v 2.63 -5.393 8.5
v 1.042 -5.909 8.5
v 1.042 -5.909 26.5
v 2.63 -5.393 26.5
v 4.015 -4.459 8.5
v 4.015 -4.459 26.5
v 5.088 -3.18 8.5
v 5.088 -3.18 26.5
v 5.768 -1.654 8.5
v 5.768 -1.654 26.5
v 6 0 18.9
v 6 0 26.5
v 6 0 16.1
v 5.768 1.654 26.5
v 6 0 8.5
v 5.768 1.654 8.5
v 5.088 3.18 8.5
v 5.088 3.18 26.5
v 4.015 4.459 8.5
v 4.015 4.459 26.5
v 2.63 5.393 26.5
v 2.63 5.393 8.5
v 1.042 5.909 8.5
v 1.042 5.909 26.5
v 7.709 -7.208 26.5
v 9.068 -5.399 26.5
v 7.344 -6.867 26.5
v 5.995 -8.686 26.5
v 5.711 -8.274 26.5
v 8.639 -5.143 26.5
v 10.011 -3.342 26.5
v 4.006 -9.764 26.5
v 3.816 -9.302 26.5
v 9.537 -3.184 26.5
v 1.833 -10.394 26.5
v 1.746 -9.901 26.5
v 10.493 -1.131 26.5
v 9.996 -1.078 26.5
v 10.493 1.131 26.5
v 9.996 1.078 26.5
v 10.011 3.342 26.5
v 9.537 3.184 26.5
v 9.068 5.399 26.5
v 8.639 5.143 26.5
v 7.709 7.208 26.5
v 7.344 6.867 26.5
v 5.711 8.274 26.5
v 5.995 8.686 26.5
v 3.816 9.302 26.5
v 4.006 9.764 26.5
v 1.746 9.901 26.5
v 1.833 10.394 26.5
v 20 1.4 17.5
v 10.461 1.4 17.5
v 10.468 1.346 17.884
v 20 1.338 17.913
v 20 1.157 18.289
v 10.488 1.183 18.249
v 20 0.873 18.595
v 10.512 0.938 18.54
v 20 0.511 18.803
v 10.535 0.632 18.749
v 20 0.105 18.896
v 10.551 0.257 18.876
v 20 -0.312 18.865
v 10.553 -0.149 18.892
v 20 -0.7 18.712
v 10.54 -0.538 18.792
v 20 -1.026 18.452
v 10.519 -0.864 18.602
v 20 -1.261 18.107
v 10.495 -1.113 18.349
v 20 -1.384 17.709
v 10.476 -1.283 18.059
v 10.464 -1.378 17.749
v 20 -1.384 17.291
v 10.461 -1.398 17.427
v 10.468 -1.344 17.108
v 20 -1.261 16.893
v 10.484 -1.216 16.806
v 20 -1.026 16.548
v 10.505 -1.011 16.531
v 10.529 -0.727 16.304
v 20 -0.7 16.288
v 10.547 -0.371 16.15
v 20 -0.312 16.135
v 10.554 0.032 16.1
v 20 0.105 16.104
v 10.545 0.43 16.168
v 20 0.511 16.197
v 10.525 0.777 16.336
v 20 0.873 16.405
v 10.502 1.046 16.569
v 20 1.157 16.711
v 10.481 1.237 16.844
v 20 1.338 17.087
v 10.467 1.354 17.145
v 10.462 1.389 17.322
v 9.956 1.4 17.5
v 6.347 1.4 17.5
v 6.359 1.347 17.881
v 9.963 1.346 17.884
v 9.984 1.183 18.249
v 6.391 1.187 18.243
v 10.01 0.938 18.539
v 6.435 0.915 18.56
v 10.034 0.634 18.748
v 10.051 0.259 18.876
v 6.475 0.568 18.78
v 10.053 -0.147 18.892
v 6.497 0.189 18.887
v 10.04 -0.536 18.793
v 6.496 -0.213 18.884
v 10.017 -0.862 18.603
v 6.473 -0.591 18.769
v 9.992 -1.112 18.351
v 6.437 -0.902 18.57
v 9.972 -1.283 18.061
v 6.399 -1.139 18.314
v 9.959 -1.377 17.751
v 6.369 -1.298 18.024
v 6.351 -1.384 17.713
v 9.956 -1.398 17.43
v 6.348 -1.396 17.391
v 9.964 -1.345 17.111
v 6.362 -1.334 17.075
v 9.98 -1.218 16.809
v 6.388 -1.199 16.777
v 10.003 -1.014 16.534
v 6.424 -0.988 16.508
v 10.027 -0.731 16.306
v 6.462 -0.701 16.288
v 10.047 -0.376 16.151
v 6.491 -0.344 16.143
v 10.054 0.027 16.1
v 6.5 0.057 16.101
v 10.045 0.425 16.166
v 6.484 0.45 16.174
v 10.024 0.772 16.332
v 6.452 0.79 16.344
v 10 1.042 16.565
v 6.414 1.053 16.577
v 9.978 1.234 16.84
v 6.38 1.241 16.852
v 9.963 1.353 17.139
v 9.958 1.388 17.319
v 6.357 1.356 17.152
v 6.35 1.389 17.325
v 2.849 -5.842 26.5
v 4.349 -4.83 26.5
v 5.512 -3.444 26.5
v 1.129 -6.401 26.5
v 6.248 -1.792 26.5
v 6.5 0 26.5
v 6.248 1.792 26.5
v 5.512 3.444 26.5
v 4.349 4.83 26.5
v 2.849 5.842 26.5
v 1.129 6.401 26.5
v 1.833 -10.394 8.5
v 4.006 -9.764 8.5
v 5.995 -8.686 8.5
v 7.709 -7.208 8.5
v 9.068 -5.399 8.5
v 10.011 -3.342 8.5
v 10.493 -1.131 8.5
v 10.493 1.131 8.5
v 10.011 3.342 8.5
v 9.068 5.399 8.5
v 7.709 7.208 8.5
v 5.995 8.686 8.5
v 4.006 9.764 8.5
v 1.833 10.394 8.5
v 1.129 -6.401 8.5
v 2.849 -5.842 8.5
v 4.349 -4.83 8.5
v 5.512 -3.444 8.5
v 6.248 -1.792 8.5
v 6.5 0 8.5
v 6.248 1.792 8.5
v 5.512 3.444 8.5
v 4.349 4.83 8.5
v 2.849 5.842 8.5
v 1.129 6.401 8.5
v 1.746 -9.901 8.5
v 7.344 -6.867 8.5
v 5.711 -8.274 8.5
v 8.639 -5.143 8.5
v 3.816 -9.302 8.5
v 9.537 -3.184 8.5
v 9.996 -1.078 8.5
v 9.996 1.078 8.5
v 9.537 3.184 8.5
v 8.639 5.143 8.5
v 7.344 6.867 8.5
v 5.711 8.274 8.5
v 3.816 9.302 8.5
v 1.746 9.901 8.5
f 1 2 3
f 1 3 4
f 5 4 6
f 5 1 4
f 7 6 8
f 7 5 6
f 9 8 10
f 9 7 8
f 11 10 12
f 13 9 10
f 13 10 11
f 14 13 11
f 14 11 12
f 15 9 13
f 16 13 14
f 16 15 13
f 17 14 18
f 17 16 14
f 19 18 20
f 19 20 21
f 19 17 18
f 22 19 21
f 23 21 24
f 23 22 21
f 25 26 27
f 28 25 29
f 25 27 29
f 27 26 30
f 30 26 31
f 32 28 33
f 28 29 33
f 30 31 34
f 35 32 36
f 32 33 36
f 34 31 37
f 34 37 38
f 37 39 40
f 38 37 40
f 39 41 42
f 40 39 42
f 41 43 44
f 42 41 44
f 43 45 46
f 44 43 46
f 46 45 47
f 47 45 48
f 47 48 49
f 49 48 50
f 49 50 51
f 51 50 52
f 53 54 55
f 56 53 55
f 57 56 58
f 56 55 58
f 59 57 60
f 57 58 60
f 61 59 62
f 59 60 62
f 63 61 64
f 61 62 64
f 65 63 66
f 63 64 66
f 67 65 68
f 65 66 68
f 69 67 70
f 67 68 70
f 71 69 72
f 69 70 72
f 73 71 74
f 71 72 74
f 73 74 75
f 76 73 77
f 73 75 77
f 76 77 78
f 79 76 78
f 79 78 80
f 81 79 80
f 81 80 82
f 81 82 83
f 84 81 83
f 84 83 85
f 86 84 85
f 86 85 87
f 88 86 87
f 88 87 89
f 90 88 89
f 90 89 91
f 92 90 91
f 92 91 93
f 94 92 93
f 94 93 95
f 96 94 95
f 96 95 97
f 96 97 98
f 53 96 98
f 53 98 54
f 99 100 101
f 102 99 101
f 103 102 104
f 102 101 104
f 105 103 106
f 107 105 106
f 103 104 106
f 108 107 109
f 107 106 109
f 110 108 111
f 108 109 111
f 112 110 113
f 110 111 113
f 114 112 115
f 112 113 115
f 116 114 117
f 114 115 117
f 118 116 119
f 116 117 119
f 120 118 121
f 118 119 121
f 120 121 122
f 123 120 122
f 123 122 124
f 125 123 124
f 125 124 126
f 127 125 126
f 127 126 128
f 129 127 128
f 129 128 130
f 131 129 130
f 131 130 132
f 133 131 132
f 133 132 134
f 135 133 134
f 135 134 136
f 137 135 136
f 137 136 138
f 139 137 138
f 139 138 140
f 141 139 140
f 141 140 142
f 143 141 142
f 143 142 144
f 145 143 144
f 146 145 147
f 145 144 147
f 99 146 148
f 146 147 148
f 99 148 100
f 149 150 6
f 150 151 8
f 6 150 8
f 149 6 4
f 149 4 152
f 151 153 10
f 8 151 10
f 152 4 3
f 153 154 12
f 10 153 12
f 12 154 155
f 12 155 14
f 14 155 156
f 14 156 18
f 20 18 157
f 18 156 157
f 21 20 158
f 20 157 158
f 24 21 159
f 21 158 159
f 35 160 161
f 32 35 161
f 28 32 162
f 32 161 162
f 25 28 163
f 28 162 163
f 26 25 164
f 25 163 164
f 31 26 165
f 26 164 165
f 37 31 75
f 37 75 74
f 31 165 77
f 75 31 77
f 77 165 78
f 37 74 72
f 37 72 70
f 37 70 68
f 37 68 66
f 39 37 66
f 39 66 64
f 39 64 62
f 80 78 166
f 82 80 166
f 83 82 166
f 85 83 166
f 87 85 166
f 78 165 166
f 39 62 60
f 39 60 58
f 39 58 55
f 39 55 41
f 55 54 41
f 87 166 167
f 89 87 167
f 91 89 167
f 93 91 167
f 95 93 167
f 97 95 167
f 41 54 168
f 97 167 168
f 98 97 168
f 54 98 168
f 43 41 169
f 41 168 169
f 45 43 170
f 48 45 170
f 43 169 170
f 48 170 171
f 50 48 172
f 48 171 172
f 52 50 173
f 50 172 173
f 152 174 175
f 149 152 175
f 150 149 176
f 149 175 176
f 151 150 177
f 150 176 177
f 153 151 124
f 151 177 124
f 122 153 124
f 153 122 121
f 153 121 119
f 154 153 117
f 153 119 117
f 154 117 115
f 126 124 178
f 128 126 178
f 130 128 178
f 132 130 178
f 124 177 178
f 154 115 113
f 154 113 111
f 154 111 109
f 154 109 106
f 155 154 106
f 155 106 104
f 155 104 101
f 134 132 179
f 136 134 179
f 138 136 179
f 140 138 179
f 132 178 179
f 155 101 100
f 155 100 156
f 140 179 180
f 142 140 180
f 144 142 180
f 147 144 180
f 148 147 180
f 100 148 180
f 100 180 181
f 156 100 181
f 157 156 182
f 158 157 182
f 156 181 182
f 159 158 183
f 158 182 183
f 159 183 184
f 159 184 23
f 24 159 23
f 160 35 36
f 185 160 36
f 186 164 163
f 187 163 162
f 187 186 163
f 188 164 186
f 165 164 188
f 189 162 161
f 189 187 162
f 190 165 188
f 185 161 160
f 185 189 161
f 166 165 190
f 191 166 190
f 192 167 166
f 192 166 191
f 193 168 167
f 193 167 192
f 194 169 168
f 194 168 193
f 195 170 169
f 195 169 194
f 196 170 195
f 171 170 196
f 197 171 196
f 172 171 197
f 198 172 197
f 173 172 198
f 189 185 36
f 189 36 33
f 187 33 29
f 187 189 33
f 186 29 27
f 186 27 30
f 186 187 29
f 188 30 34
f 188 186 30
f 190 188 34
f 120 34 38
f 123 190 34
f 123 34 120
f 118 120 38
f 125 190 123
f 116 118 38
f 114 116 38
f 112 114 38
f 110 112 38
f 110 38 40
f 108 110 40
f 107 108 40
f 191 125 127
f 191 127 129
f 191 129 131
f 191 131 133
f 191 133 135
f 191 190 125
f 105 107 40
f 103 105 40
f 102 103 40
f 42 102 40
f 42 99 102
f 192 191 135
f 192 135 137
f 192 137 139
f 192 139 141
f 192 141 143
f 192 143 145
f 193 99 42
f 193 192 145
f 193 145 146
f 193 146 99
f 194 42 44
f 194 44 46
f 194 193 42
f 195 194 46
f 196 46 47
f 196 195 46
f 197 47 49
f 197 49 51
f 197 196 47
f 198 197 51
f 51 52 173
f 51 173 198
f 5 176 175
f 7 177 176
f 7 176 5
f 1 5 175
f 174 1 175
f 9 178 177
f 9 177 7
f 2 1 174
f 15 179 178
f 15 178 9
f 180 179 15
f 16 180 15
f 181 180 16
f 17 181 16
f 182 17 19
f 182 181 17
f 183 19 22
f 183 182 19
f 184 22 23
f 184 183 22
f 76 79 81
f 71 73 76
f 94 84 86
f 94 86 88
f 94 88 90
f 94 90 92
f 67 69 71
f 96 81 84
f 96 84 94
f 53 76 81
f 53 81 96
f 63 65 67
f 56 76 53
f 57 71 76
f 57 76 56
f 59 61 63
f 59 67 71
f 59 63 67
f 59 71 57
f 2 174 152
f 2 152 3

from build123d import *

# Parameters (mm, degrees)
PAD023_DEPTH = 18
SKETCH049_R  = 1.4
PAD024_DEPTH = 14
PAD025_DEPTH = 18


with BuildPart() as part:
    # Sketch046 → Pad023 (new body)
    with BuildSketch(Plane.XY.offset(8.5)):
        with BuildLine():
            ThreePointArc((1.041889, -5.908847), (6, 0), (1.041889, 5.908847))
            Line((1.128713, 6.40125), (1.041889, 5.908847))
            ThreePointArc((1.128713, -6.40125), (6.5, 0), (1.128713, 6.40125))
            Line((1.128713, -6.40125), (1.041889, -5.908847))
        make_face()
    extrude(amount=PAD023_DEPTH)

    # Sketch049 (on DatumPlane) → Pad024 (join)
    with BuildSketch(Plane(origin=(6, 0, 26.5), x_dir=(0, 1, 0), z_dir=(1, 0, 0))):
        with Locations((0, -9)):
            Circle(SKETCH049_R)
    extrude(amount=PAD024_DEPTH)

    # Sketch050 → Pad025 (join)
    with BuildSketch(Plane.XY.offset(8.5)):
        with BuildLine():
            ThreePointArc((1.745858, -9.90125), (10.053993, 0), (1.745858, 9.90125))
            Line((1.832682, 10.393654), (1.745858, 9.90125))
            ThreePointArc((1.832682, -10.393654), (10.553993, 0), (1.832682, 10.393654))
            Line((1.832682, -10.393654), (1.745858, -9.90125))
        make_face()
    extrude(amount=PAD025_DEPTH)


solid = part.part
